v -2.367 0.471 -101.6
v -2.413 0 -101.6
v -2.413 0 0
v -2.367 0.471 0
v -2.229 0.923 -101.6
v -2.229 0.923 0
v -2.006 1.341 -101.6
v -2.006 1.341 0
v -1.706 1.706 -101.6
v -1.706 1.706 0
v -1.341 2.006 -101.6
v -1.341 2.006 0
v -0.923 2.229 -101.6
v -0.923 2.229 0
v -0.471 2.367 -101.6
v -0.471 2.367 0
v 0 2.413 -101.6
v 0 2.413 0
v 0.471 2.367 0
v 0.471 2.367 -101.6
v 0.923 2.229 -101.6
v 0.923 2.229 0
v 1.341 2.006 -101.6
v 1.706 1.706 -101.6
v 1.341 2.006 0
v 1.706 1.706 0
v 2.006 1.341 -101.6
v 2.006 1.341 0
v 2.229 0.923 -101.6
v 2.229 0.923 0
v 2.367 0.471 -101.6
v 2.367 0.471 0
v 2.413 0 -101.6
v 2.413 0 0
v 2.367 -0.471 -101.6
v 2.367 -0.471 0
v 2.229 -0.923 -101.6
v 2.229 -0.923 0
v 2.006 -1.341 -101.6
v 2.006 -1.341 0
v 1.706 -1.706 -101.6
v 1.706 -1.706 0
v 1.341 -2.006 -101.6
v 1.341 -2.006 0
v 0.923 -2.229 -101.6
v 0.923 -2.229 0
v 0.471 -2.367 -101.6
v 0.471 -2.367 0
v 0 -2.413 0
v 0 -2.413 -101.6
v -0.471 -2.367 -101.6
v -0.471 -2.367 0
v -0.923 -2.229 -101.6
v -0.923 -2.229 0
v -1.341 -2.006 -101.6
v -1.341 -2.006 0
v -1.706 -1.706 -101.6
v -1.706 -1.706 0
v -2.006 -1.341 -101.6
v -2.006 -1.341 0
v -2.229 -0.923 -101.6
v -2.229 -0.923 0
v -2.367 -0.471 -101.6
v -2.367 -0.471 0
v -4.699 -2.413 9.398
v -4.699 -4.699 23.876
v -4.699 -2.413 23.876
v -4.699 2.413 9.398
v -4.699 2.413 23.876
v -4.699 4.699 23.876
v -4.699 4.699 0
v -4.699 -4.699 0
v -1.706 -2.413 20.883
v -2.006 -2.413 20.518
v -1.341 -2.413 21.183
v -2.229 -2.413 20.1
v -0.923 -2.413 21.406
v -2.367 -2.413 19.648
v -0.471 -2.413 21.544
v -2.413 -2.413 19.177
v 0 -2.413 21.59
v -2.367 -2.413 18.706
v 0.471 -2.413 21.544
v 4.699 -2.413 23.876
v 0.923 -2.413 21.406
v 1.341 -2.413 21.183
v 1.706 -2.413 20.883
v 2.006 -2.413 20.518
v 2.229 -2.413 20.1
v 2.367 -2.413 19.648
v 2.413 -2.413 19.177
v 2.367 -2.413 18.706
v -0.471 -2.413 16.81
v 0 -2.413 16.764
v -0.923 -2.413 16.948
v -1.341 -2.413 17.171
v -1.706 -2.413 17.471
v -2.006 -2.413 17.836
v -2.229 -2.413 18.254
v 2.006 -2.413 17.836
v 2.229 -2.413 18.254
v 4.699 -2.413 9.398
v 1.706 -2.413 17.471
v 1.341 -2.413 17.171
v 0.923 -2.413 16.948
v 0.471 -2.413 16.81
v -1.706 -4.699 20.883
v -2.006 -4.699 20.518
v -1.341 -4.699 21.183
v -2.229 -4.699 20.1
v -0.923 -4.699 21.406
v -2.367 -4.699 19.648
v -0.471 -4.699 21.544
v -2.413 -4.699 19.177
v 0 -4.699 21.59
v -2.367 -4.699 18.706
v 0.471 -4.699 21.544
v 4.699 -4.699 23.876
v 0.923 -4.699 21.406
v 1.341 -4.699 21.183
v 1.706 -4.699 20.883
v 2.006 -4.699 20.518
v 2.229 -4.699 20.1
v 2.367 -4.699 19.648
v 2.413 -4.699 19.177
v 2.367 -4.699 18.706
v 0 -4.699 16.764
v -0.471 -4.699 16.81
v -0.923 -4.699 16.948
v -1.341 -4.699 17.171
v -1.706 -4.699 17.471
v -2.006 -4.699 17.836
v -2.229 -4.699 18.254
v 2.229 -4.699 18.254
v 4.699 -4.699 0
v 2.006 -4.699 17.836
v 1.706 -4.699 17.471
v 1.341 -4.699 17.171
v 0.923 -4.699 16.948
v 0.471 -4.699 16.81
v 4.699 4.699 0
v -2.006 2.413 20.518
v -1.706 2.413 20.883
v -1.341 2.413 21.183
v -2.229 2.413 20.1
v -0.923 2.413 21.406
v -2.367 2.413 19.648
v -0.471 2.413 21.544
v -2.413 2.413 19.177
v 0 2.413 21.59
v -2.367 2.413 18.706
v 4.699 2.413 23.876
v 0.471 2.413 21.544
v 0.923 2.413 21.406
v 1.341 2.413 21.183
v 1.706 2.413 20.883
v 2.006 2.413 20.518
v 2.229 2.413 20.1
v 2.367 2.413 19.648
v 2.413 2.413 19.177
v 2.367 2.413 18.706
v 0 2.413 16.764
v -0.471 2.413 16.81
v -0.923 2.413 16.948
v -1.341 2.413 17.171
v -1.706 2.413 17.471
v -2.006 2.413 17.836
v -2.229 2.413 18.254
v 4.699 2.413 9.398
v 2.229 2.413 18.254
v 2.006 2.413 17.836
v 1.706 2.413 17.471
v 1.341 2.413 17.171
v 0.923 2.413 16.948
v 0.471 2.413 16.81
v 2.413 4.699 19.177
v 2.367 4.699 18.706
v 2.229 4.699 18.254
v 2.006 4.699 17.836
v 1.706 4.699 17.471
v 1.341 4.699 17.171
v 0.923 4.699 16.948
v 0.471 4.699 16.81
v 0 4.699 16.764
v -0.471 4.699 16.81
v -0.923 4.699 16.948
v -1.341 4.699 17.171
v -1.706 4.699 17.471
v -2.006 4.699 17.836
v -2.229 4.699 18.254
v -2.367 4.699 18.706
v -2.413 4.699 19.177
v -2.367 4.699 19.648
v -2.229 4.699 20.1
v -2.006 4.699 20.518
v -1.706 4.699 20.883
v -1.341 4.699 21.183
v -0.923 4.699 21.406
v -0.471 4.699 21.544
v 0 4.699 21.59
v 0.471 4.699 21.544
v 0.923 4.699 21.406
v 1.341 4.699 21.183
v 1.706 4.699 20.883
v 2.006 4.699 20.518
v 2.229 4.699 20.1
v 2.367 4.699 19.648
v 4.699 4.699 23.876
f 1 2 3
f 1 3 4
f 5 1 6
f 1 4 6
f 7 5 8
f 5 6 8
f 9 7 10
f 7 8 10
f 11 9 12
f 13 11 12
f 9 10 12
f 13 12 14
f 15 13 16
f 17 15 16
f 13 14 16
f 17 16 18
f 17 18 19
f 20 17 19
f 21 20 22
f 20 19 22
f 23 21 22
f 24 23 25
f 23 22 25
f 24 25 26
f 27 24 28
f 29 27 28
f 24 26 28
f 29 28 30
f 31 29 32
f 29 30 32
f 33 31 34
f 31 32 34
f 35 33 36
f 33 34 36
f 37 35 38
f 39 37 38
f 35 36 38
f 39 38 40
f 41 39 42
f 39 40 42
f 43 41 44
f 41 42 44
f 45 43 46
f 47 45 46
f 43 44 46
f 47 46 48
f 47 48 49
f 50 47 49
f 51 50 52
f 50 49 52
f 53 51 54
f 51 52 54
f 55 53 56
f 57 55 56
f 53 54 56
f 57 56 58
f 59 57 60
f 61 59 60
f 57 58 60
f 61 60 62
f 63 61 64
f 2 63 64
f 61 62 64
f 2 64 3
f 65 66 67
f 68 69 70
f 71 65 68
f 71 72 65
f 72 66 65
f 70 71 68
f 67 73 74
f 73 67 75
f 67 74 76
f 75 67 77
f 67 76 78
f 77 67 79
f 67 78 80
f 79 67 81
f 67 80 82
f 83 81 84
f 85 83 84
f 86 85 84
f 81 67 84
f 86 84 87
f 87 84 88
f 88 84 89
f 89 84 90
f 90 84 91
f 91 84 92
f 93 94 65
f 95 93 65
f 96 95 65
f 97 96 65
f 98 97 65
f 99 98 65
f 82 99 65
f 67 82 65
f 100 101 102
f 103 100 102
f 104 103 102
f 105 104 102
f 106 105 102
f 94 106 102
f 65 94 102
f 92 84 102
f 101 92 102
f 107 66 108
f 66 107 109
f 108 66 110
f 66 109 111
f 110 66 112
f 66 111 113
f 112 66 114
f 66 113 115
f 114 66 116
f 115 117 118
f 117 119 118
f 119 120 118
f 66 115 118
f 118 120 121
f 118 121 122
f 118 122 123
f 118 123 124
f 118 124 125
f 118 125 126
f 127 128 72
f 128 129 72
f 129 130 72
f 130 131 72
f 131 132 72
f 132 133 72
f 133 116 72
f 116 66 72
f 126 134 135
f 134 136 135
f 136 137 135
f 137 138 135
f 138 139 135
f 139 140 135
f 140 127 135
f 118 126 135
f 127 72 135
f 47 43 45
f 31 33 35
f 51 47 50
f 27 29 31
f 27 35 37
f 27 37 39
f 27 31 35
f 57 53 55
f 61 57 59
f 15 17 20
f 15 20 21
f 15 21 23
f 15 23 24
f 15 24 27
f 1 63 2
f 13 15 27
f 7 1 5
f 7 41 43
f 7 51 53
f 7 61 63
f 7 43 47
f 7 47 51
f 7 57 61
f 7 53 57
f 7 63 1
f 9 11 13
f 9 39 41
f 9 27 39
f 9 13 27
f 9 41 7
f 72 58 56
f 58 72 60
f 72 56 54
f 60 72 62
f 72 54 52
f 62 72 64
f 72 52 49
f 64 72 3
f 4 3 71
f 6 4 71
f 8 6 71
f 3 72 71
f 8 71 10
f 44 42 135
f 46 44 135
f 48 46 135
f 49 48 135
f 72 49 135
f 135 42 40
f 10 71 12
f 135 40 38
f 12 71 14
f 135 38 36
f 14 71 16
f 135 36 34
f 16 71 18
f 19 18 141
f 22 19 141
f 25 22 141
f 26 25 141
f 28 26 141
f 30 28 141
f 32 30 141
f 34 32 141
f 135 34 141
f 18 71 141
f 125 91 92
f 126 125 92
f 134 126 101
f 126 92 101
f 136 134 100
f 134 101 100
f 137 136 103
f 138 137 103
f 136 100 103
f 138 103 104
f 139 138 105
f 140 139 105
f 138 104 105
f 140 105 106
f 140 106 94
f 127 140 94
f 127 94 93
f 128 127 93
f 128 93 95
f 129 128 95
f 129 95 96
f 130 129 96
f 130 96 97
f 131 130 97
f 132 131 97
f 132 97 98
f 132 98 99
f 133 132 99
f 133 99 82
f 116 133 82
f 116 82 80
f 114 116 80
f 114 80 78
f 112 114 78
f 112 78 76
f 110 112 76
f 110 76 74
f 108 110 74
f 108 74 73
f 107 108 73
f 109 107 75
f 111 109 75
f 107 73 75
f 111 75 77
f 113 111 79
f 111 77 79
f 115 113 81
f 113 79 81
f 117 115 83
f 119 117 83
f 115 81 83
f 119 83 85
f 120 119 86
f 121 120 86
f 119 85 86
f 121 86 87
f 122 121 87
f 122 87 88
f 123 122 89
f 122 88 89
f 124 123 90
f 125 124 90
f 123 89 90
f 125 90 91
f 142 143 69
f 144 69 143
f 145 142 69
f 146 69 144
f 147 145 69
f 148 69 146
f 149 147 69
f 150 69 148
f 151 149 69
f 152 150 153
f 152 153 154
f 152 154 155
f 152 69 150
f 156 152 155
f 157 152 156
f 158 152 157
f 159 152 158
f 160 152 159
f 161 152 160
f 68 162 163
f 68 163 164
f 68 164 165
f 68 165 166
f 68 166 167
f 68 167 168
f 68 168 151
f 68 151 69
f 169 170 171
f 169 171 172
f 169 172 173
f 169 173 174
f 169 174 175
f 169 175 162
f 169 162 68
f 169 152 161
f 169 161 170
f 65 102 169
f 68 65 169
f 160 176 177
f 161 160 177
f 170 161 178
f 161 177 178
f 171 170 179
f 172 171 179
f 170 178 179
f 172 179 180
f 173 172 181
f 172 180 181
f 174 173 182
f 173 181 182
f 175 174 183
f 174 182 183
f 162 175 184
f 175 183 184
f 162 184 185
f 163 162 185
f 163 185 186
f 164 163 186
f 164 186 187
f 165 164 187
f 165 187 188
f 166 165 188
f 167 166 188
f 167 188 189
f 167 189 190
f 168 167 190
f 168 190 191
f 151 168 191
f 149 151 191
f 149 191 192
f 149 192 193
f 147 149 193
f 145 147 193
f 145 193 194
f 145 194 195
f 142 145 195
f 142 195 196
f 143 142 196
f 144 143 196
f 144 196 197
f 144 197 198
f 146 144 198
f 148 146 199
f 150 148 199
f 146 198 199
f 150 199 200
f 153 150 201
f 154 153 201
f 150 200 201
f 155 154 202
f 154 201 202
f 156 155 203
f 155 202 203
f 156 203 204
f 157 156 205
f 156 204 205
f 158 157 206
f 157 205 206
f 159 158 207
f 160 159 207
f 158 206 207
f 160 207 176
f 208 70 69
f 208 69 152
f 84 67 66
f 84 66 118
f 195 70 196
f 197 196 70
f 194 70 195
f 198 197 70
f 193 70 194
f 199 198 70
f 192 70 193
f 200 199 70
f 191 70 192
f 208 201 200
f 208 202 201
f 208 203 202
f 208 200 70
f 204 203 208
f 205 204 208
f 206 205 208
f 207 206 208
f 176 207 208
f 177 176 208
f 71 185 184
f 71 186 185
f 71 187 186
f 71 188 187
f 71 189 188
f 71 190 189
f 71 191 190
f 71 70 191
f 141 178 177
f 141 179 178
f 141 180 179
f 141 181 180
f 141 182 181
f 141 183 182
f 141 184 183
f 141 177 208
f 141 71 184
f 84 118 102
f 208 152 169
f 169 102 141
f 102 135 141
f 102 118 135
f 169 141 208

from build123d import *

# Parameters (mm, degrees)
SKETCH1_W           = 9.398
SKETCH1_H           = 9.398
BOSS_EXTRUDE1_DEPTH = 23.876
SKETCH2_W           = 14.478
SKETCH2_H           = 4.826
CUT_EXTRUDE1_DEPTH  = 10.398
SKETCH3_R           = 2.413
CUT_EXTRUDE2_DEPTH  = 10.398
SKETCH4_R           = 2.413
BOSS_EXTRUDE2_DEPTH = 101.6


with BuildPart() as part:
    # Sketch1 → Boss-Extrude1 (new body)
    with BuildSketch(Plane.XY):
        Rectangle(SKETCH1_W, SKETCH1_H)
    extrude(amount=BOSS_EXTRUDE1_DEPTH)

    # Sketch2 → Cut-Extrude1 (cut, through all)
    with BuildSketch(Plane(origin=(4.699, 0, 0), x_dir=(0, 0, -1), z_dir=(1, 0, 0))):
        with Locations((-16.637, 0)):
            Rectangle(SKETCH2_W, SKETCH2_H)
    extrude(amount=-CUT_EXTRUDE1_DEPTH, mode=Mode.SUBTRACT)

    # Sketch3 → Cut-Extrude2 (cut, through all)
    with BuildSketch(Plane(origin=(0, 4.699, 0), x_dir=(1, 0, 0), z_dir=(0, 1, 0))):
        with Locations((0, -19.177)):
            Circle(SKETCH3_R)
    extrude(amount=-CUT_EXTRUDE2_DEPTH, mode=Mode.SUBTRACT)

    # Sketch4 → Boss-Extrude2 (add)
    with BuildSketch(Plane(origin=(0, 0, 0), x_dir=(-1, 0, 0), z_dir=(0, 0, -1))):
        Circle(SKETCH4_R)
    extrude(amount=BOSS_EXTRUDE2_DEPTH)


solid = part.part
